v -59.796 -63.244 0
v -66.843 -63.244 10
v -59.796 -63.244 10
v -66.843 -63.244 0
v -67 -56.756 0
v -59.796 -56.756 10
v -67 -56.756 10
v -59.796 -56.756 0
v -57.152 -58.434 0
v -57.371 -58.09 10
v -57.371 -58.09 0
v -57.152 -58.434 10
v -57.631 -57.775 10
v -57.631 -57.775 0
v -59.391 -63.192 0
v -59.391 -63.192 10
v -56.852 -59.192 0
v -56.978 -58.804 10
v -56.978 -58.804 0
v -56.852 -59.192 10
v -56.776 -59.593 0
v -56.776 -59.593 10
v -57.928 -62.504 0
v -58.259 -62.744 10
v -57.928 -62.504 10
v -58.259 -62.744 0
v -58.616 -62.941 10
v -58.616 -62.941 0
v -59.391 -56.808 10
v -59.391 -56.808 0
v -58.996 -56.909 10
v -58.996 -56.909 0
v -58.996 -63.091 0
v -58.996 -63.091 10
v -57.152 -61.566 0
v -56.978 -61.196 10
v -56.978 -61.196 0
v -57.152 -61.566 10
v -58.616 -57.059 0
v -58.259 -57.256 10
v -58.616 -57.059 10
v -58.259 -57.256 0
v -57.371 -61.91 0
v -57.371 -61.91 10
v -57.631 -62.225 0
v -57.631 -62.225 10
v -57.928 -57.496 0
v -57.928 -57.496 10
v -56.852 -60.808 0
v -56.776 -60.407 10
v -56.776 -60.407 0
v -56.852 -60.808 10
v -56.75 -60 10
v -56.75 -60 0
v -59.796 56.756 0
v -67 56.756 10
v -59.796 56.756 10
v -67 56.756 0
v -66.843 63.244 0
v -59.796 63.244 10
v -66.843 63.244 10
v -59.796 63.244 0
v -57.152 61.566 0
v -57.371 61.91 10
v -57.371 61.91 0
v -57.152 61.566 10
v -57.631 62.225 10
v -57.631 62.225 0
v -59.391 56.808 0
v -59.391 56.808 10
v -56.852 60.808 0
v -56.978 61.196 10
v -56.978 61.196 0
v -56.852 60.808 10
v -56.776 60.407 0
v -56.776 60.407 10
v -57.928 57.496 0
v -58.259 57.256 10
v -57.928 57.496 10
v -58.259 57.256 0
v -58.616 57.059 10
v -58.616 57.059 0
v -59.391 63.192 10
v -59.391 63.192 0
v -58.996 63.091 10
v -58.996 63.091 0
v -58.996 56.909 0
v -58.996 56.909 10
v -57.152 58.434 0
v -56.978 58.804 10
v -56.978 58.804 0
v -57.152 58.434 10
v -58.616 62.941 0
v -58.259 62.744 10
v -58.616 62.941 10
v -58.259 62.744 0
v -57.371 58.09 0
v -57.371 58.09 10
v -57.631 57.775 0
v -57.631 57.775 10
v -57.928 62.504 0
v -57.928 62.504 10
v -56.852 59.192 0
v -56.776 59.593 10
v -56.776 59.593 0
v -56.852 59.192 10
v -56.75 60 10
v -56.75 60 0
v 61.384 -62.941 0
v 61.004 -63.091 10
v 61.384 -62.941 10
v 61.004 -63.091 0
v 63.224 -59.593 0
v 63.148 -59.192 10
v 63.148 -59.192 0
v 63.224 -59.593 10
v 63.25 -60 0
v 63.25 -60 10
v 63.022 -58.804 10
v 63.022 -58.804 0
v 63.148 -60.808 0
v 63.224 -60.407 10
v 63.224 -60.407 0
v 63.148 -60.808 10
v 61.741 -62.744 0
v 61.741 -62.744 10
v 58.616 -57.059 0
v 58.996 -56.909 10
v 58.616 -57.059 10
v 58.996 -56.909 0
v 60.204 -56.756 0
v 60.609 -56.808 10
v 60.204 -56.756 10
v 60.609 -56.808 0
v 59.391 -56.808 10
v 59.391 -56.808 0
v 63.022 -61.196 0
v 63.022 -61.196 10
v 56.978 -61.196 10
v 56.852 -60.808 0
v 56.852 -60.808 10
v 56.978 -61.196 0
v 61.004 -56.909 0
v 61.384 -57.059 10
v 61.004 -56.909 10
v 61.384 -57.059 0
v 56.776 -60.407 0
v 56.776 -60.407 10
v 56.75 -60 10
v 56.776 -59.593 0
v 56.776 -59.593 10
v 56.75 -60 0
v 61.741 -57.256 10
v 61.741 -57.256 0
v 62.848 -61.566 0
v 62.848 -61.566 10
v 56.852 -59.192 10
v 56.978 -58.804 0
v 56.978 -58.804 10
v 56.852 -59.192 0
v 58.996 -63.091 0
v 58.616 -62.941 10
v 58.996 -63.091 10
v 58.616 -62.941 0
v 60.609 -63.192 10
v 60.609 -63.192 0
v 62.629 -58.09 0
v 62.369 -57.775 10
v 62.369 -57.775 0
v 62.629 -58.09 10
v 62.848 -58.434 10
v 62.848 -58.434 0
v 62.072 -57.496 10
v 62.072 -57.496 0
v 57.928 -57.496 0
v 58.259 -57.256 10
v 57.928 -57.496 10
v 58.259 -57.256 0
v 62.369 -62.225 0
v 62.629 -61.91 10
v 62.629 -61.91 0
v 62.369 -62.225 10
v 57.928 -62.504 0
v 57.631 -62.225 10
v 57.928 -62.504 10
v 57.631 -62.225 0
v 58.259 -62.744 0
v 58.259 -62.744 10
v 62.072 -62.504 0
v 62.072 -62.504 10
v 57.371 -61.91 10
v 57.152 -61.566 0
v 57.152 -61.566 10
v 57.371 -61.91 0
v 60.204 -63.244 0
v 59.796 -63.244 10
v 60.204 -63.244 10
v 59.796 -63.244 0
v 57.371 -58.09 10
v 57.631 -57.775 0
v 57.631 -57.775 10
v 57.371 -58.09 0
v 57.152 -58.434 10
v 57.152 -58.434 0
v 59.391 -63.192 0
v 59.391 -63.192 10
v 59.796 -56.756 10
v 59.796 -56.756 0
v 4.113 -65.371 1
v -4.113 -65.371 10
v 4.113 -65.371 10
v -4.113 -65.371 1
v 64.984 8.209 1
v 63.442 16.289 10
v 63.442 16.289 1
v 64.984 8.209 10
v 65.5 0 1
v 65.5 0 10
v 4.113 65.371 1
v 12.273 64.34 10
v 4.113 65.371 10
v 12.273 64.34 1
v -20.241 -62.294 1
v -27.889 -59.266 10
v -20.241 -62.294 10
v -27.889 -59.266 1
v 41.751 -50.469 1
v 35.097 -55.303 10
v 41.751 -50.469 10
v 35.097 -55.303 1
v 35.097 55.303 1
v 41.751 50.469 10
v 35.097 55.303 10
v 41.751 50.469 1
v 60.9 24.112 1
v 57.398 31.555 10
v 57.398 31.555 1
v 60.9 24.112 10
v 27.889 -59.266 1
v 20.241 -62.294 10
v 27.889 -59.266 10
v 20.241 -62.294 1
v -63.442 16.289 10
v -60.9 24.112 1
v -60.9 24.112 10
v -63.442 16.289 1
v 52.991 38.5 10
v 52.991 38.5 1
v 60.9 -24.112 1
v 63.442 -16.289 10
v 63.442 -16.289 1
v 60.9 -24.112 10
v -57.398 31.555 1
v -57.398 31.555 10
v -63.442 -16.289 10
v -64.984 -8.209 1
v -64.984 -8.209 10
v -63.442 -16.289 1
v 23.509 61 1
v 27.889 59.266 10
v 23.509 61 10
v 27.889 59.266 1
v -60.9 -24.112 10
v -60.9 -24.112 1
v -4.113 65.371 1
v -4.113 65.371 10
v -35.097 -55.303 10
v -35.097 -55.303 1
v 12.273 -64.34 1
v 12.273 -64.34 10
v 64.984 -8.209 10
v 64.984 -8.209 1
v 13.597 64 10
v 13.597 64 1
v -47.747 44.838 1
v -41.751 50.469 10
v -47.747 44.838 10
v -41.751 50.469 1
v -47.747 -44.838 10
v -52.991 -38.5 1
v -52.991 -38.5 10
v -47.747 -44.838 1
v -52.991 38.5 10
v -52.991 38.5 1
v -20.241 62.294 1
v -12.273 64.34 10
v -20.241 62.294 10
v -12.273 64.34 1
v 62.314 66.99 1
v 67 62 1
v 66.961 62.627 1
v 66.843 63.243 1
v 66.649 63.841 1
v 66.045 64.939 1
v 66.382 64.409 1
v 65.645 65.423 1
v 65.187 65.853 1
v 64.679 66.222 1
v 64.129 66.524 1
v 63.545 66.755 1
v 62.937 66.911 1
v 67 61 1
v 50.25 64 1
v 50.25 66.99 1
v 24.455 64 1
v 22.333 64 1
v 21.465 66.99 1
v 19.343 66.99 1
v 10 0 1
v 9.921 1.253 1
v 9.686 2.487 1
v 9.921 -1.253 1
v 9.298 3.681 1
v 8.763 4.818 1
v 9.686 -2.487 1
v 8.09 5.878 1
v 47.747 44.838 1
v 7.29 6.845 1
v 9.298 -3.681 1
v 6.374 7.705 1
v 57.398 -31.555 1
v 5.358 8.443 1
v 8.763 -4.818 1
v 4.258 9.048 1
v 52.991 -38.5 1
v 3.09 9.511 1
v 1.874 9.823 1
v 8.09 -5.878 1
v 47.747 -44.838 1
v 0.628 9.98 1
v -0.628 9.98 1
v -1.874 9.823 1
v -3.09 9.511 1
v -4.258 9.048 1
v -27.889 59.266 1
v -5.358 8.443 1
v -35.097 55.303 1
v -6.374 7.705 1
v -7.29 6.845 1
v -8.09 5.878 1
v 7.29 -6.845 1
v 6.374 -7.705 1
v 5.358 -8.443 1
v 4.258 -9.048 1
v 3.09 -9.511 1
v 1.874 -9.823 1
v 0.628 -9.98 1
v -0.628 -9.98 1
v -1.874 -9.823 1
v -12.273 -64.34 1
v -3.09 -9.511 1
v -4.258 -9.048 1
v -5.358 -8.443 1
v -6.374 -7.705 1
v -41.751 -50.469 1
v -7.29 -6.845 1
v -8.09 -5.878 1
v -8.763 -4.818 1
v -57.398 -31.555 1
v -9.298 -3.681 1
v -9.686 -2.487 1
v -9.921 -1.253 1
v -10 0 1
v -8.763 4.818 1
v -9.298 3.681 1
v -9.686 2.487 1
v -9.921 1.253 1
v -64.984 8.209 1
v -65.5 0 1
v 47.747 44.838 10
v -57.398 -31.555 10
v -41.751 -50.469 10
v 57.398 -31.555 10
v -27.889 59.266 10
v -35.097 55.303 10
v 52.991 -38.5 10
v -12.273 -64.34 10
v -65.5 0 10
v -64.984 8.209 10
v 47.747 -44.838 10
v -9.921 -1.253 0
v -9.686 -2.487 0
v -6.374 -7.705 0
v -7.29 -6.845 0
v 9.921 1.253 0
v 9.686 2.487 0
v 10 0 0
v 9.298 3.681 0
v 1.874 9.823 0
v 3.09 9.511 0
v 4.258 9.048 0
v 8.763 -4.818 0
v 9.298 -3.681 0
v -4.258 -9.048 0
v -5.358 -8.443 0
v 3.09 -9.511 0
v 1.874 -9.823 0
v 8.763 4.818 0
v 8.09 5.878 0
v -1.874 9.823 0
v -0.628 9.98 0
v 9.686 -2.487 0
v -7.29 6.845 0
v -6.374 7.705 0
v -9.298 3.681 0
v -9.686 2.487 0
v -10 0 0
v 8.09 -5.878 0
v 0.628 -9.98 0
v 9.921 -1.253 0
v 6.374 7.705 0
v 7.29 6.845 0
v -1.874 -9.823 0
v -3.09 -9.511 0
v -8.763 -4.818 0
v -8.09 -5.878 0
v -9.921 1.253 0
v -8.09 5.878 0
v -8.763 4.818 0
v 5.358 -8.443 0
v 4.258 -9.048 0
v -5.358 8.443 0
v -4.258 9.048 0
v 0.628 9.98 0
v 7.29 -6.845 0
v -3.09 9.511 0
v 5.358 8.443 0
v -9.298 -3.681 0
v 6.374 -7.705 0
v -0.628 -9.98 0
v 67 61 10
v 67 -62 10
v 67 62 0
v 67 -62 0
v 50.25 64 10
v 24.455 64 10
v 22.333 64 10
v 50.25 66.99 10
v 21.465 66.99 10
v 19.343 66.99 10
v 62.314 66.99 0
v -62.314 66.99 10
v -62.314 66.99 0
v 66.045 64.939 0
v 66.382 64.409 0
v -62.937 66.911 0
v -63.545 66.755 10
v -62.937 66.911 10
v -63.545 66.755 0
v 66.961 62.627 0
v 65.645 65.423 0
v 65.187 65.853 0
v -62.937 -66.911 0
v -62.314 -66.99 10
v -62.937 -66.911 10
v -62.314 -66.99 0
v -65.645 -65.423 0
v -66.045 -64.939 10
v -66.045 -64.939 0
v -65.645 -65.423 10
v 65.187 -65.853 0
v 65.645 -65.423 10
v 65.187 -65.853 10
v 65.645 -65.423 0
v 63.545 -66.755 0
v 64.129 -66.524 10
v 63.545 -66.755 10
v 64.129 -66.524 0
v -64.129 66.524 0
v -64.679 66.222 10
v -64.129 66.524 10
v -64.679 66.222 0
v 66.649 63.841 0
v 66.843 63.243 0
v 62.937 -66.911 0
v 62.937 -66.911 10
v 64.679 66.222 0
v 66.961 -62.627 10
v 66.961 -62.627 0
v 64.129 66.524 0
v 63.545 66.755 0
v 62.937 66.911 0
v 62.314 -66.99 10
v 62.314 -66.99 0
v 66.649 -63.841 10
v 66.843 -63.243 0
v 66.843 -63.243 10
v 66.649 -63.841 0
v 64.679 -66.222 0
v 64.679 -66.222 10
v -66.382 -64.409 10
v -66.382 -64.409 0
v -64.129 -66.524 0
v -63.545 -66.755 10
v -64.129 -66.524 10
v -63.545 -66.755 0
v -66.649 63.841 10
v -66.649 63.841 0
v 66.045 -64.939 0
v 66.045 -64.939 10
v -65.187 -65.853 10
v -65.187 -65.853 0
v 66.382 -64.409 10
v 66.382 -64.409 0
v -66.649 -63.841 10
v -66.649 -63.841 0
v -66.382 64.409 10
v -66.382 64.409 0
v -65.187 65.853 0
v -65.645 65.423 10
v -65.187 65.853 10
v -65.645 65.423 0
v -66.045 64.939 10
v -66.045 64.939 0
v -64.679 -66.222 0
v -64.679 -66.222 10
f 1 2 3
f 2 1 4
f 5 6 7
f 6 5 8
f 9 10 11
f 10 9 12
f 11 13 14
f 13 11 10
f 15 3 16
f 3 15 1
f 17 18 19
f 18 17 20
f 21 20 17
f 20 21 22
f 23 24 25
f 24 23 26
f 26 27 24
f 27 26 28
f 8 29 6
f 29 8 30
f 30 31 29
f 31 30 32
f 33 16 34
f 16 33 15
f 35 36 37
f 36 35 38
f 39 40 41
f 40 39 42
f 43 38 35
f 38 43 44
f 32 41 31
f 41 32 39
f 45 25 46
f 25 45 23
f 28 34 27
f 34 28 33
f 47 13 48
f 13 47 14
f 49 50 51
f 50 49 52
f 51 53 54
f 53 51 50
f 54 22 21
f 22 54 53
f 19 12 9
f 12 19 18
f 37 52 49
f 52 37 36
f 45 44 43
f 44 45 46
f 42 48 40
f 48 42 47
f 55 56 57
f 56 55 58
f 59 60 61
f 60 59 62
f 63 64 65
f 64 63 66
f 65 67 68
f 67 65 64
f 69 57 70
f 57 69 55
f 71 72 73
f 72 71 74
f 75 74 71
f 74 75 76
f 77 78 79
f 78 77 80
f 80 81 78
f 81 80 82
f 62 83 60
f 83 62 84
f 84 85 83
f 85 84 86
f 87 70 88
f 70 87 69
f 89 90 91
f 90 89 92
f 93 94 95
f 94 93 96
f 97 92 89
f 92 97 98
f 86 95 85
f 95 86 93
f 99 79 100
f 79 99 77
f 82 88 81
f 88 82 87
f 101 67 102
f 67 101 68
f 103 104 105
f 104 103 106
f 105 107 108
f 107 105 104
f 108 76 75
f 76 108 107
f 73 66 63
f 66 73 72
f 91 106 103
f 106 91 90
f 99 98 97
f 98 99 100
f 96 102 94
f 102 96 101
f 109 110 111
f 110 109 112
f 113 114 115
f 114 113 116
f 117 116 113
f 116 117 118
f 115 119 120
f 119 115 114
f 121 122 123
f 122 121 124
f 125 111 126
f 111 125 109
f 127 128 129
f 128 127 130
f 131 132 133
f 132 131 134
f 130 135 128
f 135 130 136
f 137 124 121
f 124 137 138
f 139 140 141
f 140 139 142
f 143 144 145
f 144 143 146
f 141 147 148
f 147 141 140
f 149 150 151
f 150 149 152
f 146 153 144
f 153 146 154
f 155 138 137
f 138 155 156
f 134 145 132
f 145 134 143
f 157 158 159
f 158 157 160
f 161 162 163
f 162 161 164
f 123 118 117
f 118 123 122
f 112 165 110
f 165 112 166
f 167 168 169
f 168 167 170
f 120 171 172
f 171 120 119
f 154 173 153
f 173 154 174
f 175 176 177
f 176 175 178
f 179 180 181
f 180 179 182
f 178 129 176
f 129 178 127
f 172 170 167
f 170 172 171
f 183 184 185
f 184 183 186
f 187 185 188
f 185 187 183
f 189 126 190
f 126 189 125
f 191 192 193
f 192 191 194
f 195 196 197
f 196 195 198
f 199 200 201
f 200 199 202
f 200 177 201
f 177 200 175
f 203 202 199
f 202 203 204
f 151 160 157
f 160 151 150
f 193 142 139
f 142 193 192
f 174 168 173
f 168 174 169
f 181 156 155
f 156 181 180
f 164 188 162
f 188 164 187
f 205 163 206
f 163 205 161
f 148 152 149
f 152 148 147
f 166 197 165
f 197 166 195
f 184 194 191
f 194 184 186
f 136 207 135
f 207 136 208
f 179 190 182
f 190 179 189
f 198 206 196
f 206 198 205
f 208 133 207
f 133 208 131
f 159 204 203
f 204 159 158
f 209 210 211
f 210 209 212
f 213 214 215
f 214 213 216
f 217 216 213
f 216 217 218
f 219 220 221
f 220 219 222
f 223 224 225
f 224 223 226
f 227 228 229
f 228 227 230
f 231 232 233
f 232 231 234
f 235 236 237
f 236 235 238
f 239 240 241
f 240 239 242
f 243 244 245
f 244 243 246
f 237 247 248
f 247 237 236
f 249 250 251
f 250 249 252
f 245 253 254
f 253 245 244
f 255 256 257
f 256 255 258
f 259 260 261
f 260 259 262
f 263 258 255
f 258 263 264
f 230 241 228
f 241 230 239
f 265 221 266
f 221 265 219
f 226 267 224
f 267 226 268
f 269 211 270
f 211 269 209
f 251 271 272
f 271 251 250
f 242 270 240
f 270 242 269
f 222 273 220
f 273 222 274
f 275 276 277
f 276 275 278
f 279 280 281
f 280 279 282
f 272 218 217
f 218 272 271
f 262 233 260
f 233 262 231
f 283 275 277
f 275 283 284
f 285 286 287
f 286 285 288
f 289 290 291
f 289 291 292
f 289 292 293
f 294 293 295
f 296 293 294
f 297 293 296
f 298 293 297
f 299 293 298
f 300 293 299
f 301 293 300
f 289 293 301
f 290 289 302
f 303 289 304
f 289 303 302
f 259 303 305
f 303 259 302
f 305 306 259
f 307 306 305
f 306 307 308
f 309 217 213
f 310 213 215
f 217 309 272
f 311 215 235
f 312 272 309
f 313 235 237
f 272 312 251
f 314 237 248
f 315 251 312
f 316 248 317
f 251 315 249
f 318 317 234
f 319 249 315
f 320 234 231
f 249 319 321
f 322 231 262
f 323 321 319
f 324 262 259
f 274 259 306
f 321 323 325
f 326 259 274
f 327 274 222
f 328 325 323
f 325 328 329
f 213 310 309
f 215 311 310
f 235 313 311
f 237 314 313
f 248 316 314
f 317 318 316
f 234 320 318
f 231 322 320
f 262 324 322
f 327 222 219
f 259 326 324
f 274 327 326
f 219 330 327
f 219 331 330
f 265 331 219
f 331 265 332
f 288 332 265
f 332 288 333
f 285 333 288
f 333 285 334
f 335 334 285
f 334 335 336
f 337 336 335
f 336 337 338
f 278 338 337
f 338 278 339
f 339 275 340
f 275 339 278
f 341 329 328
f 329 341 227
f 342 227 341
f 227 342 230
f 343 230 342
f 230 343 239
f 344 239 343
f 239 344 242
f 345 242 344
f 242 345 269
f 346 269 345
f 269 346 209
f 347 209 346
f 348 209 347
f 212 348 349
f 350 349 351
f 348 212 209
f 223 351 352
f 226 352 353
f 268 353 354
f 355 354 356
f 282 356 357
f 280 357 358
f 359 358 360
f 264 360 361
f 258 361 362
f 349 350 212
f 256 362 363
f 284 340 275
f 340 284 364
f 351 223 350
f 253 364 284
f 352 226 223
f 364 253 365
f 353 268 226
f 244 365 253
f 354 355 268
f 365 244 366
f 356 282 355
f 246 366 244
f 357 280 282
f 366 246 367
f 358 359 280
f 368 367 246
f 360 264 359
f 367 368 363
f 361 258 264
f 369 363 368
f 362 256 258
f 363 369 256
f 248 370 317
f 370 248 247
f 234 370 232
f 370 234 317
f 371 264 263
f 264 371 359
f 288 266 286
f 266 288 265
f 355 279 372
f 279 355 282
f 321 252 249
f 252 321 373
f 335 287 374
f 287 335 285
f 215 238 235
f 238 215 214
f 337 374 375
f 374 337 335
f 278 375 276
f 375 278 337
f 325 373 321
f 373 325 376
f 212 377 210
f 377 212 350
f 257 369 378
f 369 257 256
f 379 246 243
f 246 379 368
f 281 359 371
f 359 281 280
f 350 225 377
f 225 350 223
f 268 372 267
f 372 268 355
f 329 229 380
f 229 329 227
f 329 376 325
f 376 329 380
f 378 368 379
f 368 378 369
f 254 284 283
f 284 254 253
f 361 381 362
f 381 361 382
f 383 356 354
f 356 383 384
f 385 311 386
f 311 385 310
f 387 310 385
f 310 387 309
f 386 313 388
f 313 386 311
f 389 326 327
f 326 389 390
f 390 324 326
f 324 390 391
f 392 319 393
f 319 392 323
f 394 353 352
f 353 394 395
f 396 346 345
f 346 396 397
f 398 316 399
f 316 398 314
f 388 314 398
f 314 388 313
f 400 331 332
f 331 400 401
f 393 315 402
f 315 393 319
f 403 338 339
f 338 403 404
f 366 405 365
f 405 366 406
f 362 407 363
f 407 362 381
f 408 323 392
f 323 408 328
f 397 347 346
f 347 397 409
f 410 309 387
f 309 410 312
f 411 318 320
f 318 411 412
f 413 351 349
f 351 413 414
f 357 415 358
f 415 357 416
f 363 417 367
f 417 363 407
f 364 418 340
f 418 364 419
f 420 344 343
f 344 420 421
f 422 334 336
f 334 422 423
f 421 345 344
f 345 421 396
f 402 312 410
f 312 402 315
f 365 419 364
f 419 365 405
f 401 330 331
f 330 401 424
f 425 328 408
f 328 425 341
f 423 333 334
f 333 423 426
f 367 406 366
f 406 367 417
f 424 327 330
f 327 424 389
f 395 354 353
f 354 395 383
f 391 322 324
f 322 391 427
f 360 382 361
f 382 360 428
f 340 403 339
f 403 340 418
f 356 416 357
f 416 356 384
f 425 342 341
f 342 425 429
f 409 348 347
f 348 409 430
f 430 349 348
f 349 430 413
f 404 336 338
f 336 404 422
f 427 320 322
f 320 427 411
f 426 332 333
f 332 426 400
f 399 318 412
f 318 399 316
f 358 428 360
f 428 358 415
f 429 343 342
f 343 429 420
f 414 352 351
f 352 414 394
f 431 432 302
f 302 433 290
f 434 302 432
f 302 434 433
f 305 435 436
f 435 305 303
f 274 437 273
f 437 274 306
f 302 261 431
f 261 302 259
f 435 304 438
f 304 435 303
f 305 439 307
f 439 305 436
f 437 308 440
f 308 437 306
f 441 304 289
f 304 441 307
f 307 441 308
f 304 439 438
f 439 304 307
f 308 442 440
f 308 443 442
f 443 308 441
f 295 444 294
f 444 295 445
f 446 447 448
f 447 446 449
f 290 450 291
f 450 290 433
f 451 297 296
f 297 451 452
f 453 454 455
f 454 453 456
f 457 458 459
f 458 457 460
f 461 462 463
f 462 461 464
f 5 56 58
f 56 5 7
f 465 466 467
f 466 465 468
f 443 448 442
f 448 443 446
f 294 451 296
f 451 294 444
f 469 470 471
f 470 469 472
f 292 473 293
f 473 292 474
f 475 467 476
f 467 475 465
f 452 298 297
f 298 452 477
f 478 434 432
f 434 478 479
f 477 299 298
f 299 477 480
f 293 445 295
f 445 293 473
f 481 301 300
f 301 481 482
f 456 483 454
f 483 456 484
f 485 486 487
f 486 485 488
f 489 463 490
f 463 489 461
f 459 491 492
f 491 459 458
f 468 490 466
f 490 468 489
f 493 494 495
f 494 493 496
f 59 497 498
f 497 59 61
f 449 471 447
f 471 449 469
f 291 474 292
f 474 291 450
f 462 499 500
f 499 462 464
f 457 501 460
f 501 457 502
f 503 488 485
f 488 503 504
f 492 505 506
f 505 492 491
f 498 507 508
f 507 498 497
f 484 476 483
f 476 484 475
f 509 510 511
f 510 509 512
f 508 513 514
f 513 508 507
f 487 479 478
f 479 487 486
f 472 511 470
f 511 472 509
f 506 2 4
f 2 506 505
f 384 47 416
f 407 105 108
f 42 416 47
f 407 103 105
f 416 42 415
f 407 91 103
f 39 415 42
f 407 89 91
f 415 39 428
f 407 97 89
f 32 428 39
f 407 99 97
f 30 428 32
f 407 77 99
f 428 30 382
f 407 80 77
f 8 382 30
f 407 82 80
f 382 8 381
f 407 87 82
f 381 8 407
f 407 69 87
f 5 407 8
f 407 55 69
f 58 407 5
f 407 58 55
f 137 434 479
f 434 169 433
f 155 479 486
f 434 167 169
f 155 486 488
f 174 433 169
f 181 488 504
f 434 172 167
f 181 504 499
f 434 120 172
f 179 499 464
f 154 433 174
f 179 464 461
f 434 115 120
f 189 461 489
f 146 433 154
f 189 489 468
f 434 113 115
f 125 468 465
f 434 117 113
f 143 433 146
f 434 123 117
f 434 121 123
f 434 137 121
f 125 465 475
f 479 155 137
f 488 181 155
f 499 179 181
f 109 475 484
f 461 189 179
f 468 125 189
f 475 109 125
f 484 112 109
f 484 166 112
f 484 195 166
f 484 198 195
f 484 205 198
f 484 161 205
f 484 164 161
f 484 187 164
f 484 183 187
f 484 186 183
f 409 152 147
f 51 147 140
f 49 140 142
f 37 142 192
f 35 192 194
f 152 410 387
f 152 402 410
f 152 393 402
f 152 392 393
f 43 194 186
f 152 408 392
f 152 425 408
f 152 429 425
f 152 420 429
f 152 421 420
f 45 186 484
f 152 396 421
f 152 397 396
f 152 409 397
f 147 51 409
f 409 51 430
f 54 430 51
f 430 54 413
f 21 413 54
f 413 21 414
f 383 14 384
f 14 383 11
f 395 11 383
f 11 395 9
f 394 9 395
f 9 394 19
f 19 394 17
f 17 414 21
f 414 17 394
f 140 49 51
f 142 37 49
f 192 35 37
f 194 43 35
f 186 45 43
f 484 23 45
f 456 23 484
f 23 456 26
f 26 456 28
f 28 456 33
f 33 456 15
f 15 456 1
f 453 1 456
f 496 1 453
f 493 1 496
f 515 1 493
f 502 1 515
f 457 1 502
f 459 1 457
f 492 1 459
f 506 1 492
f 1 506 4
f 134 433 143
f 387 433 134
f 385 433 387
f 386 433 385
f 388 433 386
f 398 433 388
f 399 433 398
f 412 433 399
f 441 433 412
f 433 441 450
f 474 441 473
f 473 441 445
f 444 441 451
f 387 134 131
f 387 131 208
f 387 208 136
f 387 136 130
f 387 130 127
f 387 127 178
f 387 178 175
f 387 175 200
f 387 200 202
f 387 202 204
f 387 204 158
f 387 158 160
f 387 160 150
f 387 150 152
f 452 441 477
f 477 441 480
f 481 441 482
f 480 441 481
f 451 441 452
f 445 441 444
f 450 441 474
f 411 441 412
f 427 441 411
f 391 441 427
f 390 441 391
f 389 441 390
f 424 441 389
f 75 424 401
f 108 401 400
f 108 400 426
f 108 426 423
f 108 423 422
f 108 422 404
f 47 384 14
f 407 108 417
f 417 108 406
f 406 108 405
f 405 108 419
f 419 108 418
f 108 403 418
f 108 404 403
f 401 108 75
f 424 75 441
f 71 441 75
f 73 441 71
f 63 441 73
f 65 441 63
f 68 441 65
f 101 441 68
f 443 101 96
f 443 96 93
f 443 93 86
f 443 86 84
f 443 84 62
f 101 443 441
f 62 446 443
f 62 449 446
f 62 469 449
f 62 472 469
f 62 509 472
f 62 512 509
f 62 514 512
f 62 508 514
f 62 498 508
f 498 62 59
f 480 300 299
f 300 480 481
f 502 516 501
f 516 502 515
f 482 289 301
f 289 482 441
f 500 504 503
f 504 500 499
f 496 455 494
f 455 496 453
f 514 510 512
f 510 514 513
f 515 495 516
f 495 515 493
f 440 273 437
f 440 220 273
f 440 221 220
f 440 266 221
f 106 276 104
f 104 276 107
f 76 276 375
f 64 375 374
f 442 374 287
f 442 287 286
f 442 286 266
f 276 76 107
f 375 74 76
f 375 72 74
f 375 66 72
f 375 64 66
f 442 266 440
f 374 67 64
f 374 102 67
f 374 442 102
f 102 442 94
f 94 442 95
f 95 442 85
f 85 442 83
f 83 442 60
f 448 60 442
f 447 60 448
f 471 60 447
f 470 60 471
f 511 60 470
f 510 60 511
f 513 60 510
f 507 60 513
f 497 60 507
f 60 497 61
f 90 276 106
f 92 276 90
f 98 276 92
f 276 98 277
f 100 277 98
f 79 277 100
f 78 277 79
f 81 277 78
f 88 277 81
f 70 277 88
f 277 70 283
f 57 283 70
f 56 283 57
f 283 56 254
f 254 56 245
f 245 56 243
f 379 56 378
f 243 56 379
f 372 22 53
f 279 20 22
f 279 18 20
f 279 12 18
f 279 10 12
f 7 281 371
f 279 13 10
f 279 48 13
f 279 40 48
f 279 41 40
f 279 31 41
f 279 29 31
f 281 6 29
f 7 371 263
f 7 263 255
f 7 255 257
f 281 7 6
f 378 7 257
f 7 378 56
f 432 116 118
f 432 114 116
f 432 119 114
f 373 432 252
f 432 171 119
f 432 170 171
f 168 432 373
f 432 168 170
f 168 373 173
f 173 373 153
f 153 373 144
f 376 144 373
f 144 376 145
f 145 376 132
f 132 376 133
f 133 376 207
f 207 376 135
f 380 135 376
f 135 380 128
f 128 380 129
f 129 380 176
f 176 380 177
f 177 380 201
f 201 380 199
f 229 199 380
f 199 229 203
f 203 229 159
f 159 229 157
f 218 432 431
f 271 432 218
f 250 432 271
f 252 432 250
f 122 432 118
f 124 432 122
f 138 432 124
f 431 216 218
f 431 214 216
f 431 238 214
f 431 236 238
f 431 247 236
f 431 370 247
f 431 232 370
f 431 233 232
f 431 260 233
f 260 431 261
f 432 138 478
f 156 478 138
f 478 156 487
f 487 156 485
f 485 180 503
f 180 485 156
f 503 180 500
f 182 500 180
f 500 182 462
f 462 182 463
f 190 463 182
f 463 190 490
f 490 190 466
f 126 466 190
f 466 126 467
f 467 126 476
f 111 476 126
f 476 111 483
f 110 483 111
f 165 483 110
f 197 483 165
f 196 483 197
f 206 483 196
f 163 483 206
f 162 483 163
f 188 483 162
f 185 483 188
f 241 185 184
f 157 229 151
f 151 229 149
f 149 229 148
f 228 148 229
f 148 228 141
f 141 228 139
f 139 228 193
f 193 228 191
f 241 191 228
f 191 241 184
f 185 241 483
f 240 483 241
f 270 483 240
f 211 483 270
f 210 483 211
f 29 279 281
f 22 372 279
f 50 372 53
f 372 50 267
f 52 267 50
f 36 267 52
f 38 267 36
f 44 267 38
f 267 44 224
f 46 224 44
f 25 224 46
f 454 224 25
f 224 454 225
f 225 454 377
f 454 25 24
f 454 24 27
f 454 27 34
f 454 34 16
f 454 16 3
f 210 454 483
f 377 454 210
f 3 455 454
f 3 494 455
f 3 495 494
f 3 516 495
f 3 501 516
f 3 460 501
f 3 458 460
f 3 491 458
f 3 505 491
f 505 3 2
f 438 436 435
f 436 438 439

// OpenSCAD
$fn = 50;


difference() {
	union() {
		translate(v = [0, 0, 0]) {
			rotate(a = [0, 0, 0]) {
				hull() {
					translate(v = [-62.0000000000, 62.0000000000, 0]) {
						rotate(a = [0, 0, 0]) {
							translate(v = [0, 0, 0]) {
								rotate(a = [0, 0, 0]) {
									cylinder(h = 10, r = 5);
								}
							}
						}
					}
					translate(v = [62.0000000000, 62.0000000000, 0]) {
						rotate(a = [0, 0, 0]) {
							translate(v = [0, 0, 0]) {
								rotate(a = [0, 0, 0]) {
									cylinder(h = 10, r = 5);
								}
							}
						}
					}
					translate(v = [-62.0000000000, -62.0000000000, 0]) {
						rotate(a = [0, 0, 0]) {
							translate(v = [0, 0, 0]) {
								rotate(a = [0, 0, 0]) {
									cylinder(h = 10, r = 5);
								}
							}
						}
					}
					translate(v = [62.0000000000, -62.0000000000, 0]) {
						rotate(a = [0, 0, 0]) {
							translate(v = [0, 0, 0]) {
								rotate(a = [0, 0, 0]) {
									cylinder(h = 10, r = 5);
								}
							}
						}
					}
				}
			}
		}
	}
	union() {
		translate(v = [-67.5000000000, -60.0000000000, -125]) {
			rotate(a = [0, 0, 0]) {
				hull() {
					translate(v = [7.5000000000, 0, 0]) {
						rotate(a = [0, 0, 0]) {
							translate(v = [0, 0, 0]) {
								rotate(a = [0, 0, 0]) {
									cylinder(h = 250, r = 3.2500000000);
								}
							}
						}
					}
					translate(v = [-7.5000000000, 0, 0]) {
						rotate(a = [0, 0, 0]) {
							translate(v = [0, 0, 0]) {
								rotate(a = [0, 0, 0]) {
									cylinder(h = 250, r = 3.2500000000);
								}
							}
						}
					}
				}
			}
		}
		translate(v = [-67.5000000000, 60.0000000000, -125]) {
			rotate(a = [0, 0, 0]) {
				hull() {
					translate(v = [7.5000000000, 0, 0]) {
						rotate(a = [0, 0, 0]) {
							translate(v = [0, 0, 0]) {
								rotate(a = [0, 0, 0]) {
									cylinder(h = 250, r = 3.2500000000);
								}
							}
						}
					}
					translate(v = [-7.5000000000, 0, 0]) {
						rotate(a = [0, 0, 0]) {
							translate(v = [0, 0, 0]) {
								rotate(a = [0, 0, 0]) {
									cylinder(h = 250, r = 3.2500000000);
								}
							}
						}
					}
				}
			}
		}
		translate(v = [60.0000000000, -60.0000000000, -125.0000000000]) {
			rotate(a = [0, 0, 0]) {
				cylinder(h = 250, r = 3.2500000000);
			}
		}
		translate(v = [0, 0, 1.0000000000]) {
			rotate(a = [0, 0, 0]) {
				cylinder(h = 12, r = 65.5000000000);
			}
		}
		translate(v = [0, 0, -5.0000000000]) {
			rotate(a = [0, 0, 0]) {
				cylinder(h = 10, r = 10.0000000000);
			}
		}
		translate(v = [0.0000000000, 61.0000000000, 1]) {
			rotate(a = [0, 0, 0]) {
				cube(size = [67.0000000000, 3, 12]);
			}
		}
		translate(v = [50.2500000000, 61.0000000000, 1]) {
			rotate(a = [0, 0, 0]) {
				cube(size = [16.7500000000, 6, 12]);
			}
		}
		translate(v = [18.5833333333, 67.7500000000, 1]) {
			rotate(a = [0, 0, -45]) {
				cube(size = [7.5000000000, 1.5000000000, 12]);
			}
		}
	}
}
